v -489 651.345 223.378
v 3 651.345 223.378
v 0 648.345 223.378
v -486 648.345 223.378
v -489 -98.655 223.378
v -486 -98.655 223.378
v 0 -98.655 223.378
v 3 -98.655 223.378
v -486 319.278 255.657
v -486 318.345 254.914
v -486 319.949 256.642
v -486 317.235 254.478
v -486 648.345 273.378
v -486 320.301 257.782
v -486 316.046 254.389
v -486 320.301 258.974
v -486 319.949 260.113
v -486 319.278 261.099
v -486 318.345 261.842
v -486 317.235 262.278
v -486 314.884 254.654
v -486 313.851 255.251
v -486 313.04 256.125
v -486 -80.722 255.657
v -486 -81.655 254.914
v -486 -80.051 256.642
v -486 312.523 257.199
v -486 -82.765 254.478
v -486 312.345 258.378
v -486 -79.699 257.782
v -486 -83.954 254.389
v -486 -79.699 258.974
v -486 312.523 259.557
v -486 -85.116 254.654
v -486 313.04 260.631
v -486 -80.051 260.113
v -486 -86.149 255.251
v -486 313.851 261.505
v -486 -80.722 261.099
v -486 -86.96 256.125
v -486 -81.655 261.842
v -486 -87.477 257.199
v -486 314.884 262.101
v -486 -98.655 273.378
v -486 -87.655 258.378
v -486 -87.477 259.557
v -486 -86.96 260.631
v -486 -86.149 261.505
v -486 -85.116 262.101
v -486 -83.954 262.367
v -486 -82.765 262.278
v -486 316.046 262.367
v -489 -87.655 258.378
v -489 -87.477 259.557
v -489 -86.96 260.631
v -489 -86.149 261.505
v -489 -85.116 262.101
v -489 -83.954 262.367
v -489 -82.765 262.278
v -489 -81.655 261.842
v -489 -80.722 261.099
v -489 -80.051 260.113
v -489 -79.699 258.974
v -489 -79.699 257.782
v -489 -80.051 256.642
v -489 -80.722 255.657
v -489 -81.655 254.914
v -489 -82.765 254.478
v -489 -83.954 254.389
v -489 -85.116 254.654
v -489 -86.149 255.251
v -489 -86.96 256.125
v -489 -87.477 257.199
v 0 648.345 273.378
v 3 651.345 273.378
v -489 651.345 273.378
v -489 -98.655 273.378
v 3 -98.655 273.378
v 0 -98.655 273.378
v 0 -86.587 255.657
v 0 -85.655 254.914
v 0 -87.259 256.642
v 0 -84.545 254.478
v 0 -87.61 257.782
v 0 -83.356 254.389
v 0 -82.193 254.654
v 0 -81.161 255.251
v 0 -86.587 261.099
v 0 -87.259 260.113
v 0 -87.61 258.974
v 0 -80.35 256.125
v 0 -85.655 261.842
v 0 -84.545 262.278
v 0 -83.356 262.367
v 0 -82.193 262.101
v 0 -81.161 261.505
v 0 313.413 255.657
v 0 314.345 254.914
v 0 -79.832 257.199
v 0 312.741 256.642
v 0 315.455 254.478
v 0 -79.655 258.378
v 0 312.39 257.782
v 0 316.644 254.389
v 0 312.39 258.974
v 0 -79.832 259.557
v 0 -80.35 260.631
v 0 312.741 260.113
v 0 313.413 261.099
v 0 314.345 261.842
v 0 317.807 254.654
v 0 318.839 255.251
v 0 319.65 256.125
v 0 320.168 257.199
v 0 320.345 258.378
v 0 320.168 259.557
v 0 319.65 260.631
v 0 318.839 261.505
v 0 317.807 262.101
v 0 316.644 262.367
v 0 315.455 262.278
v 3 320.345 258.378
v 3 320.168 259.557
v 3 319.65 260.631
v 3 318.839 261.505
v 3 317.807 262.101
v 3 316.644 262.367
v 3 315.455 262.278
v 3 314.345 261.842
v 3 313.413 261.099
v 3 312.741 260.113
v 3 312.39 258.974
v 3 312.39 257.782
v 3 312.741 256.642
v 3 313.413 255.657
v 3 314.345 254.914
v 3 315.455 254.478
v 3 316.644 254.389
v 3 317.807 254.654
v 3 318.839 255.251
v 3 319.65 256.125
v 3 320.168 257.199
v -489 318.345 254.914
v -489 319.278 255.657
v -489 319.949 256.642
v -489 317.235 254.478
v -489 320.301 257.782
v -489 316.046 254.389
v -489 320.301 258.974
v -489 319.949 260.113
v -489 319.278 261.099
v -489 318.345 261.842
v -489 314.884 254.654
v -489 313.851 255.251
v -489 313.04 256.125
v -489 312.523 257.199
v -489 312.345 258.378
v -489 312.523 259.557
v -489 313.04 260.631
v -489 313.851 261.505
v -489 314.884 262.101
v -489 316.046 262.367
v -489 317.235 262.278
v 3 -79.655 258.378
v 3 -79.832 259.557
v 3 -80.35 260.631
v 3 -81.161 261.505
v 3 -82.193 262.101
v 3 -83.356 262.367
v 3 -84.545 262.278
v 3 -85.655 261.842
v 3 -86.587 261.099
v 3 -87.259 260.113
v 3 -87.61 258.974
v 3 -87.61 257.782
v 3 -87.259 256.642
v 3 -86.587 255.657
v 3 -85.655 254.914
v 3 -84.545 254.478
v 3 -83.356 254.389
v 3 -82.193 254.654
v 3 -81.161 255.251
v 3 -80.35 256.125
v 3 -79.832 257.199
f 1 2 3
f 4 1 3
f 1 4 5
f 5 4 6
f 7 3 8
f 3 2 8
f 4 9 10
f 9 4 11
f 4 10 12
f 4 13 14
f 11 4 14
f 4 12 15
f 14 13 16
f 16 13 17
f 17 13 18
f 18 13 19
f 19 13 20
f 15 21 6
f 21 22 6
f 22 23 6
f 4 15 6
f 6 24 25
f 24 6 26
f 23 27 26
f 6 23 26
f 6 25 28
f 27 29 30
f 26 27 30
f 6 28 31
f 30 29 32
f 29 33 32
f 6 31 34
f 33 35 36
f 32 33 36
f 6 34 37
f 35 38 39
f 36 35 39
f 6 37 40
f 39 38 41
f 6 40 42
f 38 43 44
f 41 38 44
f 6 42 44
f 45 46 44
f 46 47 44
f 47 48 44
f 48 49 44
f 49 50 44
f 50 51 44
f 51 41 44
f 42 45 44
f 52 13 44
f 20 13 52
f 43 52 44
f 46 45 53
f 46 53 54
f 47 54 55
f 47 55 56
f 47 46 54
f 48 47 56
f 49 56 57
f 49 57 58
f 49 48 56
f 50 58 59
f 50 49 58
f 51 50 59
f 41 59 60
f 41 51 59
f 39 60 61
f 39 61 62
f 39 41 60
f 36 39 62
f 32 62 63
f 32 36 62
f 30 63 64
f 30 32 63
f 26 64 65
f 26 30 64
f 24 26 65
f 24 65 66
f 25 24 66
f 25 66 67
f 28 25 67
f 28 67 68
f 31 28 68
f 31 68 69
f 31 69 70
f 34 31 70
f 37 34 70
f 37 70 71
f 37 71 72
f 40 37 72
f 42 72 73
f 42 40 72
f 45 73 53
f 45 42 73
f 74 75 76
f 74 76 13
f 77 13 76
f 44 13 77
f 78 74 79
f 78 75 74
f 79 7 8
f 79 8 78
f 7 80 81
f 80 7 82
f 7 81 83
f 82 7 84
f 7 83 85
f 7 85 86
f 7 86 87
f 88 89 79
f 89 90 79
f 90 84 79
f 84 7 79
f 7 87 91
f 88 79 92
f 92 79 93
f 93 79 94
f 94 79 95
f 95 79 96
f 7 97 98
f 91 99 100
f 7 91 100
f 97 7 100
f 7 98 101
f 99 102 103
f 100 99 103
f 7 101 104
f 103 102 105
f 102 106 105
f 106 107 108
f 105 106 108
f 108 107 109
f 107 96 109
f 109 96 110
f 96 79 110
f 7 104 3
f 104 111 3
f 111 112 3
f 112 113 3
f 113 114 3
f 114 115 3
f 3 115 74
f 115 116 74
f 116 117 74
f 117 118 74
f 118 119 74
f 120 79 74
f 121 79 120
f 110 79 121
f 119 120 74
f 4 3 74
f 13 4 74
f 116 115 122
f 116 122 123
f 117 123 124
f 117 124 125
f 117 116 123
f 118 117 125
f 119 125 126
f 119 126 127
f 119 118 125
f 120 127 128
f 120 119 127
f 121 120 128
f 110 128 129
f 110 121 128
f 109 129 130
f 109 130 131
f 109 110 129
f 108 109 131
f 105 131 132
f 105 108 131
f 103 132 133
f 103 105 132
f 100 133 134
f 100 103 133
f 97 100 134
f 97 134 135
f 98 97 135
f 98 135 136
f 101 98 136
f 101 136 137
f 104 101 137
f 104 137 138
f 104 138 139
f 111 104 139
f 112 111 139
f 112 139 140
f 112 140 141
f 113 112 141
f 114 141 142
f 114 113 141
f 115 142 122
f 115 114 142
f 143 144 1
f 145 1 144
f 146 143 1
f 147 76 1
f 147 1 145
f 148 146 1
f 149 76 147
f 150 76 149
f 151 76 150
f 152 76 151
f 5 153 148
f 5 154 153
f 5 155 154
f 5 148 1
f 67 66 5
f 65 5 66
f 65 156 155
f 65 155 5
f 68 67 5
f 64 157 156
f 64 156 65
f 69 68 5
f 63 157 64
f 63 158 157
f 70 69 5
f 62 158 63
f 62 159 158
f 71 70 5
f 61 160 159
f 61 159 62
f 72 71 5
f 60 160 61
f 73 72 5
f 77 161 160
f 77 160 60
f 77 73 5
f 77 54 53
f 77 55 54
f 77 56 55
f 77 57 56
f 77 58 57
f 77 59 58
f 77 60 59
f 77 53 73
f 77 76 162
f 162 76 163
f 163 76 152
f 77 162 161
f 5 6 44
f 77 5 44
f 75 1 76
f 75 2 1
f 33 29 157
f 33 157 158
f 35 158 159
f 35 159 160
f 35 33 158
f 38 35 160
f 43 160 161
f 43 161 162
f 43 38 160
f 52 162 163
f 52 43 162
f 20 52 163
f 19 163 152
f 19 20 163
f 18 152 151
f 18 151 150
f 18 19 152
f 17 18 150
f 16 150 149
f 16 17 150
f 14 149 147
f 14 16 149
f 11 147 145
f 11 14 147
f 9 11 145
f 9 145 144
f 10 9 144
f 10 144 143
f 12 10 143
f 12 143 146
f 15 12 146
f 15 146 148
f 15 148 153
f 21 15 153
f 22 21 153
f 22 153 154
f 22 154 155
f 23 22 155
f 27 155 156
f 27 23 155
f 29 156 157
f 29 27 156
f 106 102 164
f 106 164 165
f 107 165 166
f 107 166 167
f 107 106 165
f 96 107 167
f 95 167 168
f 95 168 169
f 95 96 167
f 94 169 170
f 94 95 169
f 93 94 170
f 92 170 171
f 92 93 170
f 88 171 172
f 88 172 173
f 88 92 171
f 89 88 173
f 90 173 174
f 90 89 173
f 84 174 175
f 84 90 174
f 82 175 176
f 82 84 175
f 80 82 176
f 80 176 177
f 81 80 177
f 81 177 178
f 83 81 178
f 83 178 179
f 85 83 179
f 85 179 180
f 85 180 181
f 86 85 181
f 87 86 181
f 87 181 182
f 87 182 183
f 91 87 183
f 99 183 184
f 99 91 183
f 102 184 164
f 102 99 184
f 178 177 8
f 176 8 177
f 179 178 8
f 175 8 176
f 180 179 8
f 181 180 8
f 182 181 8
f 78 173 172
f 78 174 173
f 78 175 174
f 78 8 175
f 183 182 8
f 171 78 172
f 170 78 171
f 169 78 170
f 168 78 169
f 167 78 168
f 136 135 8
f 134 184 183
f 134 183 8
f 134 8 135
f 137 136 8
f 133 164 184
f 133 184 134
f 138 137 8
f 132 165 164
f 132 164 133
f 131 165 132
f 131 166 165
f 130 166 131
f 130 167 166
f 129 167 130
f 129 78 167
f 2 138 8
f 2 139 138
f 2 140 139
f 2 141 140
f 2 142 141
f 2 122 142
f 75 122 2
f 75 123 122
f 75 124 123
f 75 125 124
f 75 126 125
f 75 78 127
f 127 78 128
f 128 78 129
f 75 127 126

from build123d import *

# Parameters (mm, degrees)
F0_W     = 747
F0_H     = 50
F0_R     = 4
F0_W_2   = 3
F1_DEPTH = 3
F2_DEPTH = 486
F3_W     = 750
F3_H     = 50
F3_R     = 4
F4_DEPTH = 3


with BuildPart() as f1:
    # F0 (on Right) → F1 (new body)
    with BuildSketch(Plane.YZ):
        with Locations((274.845328, 248.377842)):
            Rectangle(F0_W, F0_H)
        with Locations((-83.654672, 258.377842)):
            Circle(F0_R, mode=Mode.SUBTRACT)
        with Locations((316.345328, 258.377842)):
            Circle(F0_R, mode=Mode.SUBTRACT)
        with Locations((649.845328, 248.377842)):
            Rectangle(F0_W_2, F0_H)
    extrude(amount=F1_DEPTH)

    # F0 (on Right) → F2 (join)
    with BuildSketch(Plane.YZ):
        with Locations((649.845328, 248.377842)):
            Rectangle(F0_W_2, F0_H)
    extrude(amount=-F2_DEPTH)

    # F3 (on face) → F4 (join)
    with BuildSketch(Plane(origin=(-486, 0, 0), x_dir=(0, -1, 0), z_dir=(-1, 0, 0))):
        with Locations((-276.345328, 248.377842)):
            Rectangle(F3_W, F3_H)
        with Locations((-316.345328, 258.377842)):
            Circle(F3_R, mode=Mode.SUBTRACT)
        with Locations((83.654672, 258.377842)):
            Circle(F3_R, mode=Mode.SUBTRACT)
    extrude(amount=F4_DEPTH)


solid = f1.part
